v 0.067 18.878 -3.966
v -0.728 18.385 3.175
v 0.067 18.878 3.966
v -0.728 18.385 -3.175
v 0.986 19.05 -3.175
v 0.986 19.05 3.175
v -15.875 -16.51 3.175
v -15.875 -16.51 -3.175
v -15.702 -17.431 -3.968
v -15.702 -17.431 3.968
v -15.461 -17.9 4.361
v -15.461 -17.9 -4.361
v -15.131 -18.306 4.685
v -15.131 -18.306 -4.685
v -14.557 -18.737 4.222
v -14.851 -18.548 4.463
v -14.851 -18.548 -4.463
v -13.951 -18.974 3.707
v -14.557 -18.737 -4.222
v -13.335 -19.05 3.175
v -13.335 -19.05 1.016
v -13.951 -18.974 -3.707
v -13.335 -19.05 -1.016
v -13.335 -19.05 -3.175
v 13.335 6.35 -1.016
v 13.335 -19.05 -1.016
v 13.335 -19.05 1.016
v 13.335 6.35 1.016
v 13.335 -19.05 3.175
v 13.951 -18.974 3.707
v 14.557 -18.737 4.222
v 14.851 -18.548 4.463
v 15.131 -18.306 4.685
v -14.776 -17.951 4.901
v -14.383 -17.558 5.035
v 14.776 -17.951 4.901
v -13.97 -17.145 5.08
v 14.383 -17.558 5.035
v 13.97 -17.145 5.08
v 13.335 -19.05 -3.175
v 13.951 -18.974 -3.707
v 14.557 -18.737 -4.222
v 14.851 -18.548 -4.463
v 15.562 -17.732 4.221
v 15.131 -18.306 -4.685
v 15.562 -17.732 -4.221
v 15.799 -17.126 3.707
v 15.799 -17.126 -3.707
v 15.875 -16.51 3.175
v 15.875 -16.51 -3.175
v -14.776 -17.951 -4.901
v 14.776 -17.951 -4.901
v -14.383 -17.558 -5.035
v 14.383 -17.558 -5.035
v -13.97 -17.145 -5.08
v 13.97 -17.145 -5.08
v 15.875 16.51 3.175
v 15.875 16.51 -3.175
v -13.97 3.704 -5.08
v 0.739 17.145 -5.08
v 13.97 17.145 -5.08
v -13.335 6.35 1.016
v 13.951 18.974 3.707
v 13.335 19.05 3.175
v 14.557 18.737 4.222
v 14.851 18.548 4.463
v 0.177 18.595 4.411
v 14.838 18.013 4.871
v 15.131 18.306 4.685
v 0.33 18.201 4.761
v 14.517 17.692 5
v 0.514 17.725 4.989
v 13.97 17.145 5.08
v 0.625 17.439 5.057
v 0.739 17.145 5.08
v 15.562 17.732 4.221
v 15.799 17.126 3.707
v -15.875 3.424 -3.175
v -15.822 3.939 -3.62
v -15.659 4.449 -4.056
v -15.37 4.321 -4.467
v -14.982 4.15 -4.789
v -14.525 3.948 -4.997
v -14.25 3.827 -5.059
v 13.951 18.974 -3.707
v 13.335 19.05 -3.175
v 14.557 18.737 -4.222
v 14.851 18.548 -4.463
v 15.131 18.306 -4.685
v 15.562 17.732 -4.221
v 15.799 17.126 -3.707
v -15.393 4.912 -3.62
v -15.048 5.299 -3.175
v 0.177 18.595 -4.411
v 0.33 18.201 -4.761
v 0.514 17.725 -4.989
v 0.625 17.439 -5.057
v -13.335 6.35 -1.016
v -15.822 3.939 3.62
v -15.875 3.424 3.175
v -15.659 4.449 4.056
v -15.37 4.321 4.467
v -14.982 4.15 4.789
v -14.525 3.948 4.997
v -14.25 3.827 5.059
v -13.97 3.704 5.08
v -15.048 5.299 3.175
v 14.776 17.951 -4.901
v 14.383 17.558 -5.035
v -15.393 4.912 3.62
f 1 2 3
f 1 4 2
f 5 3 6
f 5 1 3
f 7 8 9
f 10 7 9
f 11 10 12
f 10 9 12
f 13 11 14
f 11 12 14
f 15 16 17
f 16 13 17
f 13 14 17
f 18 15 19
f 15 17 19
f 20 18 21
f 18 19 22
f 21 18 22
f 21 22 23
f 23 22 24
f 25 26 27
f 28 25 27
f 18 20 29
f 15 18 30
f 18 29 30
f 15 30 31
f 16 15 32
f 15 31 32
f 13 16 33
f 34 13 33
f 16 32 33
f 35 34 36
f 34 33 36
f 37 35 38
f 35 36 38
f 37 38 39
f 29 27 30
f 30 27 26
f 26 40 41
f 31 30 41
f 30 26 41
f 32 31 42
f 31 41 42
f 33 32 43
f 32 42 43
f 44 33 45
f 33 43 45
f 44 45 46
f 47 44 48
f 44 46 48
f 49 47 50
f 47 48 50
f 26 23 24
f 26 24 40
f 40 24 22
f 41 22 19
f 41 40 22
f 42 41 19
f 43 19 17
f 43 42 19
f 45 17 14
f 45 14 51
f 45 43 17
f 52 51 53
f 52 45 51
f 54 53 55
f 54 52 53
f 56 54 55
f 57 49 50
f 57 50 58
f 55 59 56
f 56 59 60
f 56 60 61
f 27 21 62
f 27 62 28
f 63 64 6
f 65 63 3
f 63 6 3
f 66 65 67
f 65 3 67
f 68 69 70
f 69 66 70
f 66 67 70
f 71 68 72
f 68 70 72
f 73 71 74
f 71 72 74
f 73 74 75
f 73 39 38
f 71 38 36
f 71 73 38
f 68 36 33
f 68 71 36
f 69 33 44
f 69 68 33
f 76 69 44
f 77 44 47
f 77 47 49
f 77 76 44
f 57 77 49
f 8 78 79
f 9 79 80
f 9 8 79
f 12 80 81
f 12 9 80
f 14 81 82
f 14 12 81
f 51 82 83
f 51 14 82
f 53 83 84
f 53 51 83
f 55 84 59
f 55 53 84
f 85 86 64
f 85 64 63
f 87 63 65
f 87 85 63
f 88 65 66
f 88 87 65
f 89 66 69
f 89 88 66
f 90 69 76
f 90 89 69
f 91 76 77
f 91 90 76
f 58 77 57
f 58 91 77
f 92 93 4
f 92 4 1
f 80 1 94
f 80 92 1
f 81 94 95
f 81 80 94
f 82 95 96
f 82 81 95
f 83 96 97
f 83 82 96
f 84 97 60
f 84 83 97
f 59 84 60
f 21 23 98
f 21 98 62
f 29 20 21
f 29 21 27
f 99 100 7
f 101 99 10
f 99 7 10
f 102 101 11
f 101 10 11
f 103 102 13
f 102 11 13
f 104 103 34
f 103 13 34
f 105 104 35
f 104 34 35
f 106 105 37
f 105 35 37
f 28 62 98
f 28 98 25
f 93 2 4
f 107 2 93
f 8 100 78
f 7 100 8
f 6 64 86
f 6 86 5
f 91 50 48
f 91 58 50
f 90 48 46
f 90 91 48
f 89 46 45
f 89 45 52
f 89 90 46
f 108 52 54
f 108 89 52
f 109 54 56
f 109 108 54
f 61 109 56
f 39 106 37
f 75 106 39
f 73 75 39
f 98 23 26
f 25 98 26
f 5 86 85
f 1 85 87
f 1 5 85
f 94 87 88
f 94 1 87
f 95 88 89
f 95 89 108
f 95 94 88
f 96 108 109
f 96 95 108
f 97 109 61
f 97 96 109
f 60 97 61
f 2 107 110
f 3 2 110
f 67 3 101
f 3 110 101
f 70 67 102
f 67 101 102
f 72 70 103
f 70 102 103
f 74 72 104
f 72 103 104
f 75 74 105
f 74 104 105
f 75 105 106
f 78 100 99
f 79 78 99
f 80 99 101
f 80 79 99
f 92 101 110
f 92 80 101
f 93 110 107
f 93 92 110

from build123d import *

# Parameters (mm, degrees)
F1_DEPTH      = 5.08
F1_DEPTH_BACK = 5.08
F2_R          = 1.905
F3_T1_DEPTH   = 19.05
F3_T3_DEPTH   = 11.9486373525
F3_T5_DEPTH   = 11.278635061
F4_W          = 26.67
F4_H          = 2.0311224633
F5_DEPTH      = 25.4


# Not quite as in the source:
# - a fillet or chamfer that OpenCascade refuses, or shapes differently, is made with other operations: its cross-section is extruded or revolved along the edge and cut away or added


with BuildPart() as f1:
    # F0 (on Top) → F1 (new body, two sides)
    with BuildSketch(Plane.XY) as f1_sk:
        Polygon((-15.875, -19.05), (15.875, -19.05), (15.875, 19.05), (0, 19.05), (-15.875, 4.5436509977), align=None)
    extrude(amount=F1_DEPTH)
    extrude(f1_sk.sketch, amount=-F1_DEPTH_BACK)

    # F2
    f2_edges = [f1.edges().sort_by_distance(p)[0] for p in [
        (-15.875, -7.253175, 5.08),
        (0, -19.05, 5.08),
        (15.875, 0, 5.08),
        (7.9375, 19.05, 5.08),
        (-7.9375, 11.796825, 5.08),
        (-15.875, -7.253175, -5.08),
        (0, -19.05, -5.08),
        (15.875, 0, -5.08),
        (7.9375, 19.05, -5.08),
        (-7.9375, 11.796825, -5.08),
    ]]
    fillet(f2_edges, radius=F2_R)

    # F3: fillet of radius 2.54 on 15 edges, made by hand

    # F3_s2 → F3_t1 (cut)
    with BuildSketch(Plane.XY.offset(-9.525)):
        with BuildLine():
            ThreePointArc((13.335, -19.05), (15.1310512242, -18.3060512242), (15.875, -16.51))
            Line((15.875, -16.51), (15.875, -19.05))
            Line((15.875, -19.05), (13.335, -19.05))
        make_face()
        with BuildLine():
            ThreePointArc((-15.875, -16.51), (-15.1310512242, -18.3060512242), (-13.335, -19.05))
            Line((-13.335, -19.05), (-15.875, -19.05))
            Line((-15.875, -19.05), (-15.875, -16.51))
        make_face()
        with BuildLine():
            ThreePointArc((13.335, 19.05), (15.1310512242, 18.3060512242), (15.875, 16.51))
            Line((15.875, 16.51), (15.875, 19.05))
            Line((15.875, 19.05), (13.335, 19.05))
        make_face()
    extrude(amount=F3_T1_DEPTH, mode=Mode.SUBTRACT)

    # F3_s4 → F3_t3 (cut)
    with BuildSketch(Plane.XY.offset(-5.9743186762)):
        with BuildLine():
            ThreePointArc((-15.875, 3.4239235272), (-15.6591819915, 4.4485103076), (-15.048403094, 5.2989834829))
            Line((-15.048403094, 5.2989834829), (-15.875, 4.5436509977))
            Line((-15.875, 4.5436509977), (-15.875, 3.4239235272))
        make_face()
    extrude(amount=F3_T3_DEPTH, mode=Mode.SUBTRACT)

    # F3_s6 → F3_t5 (cut)
    with BuildSketch(Plane.XY.offset(-5.6393175305)):
        with BuildLine():
            ThreePointArc((-0.7276760818, 18.3850599557), (0.0667744257, 18.8779371072), (0.9857270122, 19.05))
            Line((0.9857270122, 19.05), (0, 19.05))
            Line((0, 19.05), (-0.7276760818, 18.3850599557))
        make_face()
    extrude(amount=F3_T5_DEPTH, mode=Mode.SUBTRACT)

    # F4 (on face) → F5 (cut)
    with BuildSketch(Plane.XZ.offset(19.05)):
        Rectangle(F4_W, F4_H)
    extrude(amount=-F5_DEPTH, mode=Mode.SUBTRACT)


solid = f1.part
